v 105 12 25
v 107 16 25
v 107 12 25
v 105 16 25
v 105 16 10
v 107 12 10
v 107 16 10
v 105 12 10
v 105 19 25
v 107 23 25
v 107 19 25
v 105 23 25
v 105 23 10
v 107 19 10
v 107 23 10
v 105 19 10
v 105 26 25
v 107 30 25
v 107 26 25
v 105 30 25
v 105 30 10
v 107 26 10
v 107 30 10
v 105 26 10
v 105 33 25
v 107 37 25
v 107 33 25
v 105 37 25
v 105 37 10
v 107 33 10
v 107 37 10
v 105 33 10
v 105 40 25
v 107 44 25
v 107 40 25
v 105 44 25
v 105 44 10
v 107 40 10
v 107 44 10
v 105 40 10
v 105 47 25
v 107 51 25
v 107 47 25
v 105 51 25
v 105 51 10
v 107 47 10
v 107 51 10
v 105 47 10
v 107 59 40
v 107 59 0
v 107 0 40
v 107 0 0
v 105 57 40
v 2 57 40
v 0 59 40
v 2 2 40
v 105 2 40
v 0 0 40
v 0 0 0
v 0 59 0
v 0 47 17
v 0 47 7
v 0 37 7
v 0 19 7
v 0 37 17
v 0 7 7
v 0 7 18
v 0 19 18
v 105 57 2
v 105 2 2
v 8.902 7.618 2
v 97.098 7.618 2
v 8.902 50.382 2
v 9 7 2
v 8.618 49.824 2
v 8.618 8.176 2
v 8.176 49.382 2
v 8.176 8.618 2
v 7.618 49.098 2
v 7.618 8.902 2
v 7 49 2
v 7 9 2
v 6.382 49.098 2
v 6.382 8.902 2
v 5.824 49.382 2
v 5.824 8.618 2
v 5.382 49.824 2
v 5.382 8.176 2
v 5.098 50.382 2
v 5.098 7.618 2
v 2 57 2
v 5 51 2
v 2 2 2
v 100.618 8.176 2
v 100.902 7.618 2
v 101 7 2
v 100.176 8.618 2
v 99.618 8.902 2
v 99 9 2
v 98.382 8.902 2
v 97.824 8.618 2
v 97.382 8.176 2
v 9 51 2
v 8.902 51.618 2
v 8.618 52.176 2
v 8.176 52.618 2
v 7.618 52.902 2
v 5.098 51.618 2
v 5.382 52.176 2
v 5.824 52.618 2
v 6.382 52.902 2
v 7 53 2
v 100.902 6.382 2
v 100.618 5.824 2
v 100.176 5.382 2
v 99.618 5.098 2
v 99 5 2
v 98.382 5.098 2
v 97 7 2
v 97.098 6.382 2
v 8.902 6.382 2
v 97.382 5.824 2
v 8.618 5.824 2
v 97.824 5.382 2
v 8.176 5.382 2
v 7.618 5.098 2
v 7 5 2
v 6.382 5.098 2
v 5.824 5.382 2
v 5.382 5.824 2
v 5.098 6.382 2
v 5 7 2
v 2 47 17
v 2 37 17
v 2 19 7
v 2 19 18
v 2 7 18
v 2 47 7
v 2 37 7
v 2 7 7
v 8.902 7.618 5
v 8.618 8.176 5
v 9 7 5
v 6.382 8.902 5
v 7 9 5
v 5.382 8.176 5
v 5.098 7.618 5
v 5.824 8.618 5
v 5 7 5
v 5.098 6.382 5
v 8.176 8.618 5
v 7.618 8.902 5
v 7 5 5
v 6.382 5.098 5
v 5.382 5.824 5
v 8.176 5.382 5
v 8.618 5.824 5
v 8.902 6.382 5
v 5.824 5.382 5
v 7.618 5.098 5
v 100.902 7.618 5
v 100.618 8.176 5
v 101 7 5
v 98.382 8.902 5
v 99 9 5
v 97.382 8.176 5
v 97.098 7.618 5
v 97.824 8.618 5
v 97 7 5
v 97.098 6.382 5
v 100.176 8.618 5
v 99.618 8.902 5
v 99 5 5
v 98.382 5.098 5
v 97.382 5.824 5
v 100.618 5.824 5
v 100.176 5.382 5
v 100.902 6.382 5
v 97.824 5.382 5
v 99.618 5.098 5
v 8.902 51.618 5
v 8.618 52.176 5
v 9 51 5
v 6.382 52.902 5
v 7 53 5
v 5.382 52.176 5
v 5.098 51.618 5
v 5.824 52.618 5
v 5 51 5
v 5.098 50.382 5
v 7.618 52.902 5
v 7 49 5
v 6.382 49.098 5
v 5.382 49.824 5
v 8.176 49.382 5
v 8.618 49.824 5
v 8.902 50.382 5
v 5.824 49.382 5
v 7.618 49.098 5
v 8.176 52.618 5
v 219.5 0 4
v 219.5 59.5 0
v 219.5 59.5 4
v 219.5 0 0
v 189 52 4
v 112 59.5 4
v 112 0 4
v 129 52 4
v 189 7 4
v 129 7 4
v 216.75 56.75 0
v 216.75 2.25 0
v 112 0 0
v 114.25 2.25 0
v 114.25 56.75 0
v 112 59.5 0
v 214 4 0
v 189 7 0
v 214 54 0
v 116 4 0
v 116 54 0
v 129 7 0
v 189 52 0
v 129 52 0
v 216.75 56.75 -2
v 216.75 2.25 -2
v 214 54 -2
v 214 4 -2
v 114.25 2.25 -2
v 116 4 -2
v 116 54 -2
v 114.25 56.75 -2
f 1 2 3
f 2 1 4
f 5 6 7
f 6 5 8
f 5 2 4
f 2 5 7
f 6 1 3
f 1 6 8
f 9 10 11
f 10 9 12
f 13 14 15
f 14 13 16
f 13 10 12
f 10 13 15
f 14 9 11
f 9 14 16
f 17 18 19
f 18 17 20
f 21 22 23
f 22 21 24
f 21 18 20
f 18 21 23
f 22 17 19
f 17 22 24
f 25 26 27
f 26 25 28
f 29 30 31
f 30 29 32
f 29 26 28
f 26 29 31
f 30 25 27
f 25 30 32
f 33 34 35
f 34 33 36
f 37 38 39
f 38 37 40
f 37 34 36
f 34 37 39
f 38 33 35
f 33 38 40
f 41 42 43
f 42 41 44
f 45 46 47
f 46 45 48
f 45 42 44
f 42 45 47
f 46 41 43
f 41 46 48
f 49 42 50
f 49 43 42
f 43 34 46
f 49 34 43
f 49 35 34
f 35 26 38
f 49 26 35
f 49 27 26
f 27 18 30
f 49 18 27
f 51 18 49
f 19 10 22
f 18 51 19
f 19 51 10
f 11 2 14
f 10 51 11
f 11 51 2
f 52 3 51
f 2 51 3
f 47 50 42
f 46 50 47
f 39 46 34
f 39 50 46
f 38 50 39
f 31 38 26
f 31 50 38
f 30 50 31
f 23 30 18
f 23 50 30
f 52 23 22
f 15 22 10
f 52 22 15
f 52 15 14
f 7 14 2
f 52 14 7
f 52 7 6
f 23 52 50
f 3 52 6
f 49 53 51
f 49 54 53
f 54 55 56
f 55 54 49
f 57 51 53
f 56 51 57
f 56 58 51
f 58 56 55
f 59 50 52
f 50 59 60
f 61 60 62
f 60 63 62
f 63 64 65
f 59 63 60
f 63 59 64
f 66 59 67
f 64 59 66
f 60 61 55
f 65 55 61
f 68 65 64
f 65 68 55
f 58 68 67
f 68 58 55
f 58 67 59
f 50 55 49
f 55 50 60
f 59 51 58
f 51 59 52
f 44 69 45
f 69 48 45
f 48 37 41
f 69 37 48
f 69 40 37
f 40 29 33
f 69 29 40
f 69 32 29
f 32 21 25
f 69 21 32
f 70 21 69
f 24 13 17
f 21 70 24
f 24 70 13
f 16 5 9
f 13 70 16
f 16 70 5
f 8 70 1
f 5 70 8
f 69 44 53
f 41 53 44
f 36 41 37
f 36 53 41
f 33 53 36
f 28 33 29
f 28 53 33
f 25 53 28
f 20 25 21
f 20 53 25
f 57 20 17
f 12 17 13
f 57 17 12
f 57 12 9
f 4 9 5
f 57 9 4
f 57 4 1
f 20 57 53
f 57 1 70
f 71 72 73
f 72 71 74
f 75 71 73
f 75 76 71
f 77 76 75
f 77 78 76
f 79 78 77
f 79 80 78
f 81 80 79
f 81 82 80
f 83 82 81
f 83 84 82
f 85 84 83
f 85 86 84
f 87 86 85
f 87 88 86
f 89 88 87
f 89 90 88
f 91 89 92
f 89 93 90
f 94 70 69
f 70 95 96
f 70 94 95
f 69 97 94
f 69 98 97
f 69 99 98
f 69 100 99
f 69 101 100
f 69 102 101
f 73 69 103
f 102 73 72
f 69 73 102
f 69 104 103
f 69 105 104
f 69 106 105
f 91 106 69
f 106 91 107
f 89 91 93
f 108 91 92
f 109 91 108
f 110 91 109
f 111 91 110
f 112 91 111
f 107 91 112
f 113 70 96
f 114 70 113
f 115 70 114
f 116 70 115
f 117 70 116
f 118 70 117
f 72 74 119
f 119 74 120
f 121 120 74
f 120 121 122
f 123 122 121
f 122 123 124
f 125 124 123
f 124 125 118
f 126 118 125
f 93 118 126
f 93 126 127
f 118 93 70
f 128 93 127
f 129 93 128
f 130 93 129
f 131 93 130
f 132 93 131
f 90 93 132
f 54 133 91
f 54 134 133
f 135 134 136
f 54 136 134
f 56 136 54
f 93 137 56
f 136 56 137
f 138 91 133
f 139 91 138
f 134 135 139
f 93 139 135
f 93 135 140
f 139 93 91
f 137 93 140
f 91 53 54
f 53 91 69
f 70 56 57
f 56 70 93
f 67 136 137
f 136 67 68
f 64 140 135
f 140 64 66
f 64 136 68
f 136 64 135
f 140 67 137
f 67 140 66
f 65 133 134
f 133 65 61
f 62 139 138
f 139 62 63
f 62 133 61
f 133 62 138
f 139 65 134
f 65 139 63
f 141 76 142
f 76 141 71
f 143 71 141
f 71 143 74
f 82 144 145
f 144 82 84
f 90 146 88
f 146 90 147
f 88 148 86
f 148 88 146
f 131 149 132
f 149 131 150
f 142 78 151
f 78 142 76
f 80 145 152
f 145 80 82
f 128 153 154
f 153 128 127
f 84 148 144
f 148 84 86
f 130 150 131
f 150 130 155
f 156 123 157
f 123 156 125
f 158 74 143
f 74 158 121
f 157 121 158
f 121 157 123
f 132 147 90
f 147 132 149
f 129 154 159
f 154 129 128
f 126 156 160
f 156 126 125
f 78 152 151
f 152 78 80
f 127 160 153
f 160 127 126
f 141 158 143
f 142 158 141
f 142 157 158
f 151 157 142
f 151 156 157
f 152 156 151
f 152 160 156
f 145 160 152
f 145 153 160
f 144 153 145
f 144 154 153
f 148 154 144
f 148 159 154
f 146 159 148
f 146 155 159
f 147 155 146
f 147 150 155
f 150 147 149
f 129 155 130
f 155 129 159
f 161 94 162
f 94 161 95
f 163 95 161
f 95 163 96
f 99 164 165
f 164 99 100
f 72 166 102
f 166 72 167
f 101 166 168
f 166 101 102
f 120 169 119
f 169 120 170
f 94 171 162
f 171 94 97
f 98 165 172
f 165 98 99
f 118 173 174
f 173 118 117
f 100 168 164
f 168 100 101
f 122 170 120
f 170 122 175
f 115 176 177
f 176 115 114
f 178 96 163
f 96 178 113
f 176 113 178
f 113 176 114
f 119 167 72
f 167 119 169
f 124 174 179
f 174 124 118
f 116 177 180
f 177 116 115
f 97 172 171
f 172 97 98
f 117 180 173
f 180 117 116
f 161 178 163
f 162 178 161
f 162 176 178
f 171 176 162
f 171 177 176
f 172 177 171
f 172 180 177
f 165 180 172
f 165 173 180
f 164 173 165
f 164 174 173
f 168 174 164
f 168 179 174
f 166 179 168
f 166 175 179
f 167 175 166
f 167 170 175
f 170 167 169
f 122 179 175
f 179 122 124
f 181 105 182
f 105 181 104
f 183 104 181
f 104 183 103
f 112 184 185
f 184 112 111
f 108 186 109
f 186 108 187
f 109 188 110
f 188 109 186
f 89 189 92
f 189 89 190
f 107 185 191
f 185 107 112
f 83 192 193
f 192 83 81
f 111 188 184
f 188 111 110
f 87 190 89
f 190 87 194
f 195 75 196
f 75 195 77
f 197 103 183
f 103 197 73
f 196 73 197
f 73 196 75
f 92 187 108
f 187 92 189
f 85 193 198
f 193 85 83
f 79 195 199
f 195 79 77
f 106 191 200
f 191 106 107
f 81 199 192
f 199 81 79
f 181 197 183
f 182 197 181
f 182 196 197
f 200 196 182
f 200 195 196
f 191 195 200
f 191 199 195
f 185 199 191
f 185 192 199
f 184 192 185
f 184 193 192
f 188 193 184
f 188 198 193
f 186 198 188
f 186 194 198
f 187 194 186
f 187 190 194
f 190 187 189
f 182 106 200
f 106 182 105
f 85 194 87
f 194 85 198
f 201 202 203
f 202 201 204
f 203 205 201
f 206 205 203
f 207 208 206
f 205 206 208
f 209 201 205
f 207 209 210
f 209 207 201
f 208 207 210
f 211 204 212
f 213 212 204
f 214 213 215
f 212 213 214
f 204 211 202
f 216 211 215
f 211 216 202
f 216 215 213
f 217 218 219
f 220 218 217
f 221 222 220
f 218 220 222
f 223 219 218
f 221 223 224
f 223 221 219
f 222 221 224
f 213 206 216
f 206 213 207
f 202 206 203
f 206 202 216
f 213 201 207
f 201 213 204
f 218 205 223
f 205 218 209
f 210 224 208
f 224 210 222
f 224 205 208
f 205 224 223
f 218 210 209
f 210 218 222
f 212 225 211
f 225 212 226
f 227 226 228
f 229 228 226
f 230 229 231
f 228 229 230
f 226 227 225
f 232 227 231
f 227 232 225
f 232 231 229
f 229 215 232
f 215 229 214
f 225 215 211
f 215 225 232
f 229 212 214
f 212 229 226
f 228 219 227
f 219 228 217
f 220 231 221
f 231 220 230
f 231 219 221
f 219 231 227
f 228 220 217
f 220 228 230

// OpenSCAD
/*
  CAJA PARA RELOJ ARDUINO MEGA + TFT
  Diseño paramétrico para Impresión 3D
*/

// --- PARAMETROS ---
ancho_mega = 54;
largo_mega = 102;
alto_caja = 40;
pared = 2;
tolerancia = 0.5;

// --- DIBUJO ---
part = "all"; // [all, base, lid]

if (part == "all" || part == "base") {
    translate([0, 0, 0]) caja_base();
}

if (part == "all" || part == "lid") {
    translate([part=="all" ? largo_mega + 10 : 0, 0, 0]) tapa();
}

module caja_base() {
    difference() {
        // Cuerpo exterior
        cube([largo_mega + pared*2 + tolerancia*2, ancho_mega + pared*2 + tolerancia*2, alto_caja]);
        
        // Vaciado interior
        translate([pared, pared, pared])
            cube([largo_mega + tolerancia*2, ancho_mega + tolerancia*2, alto_caja]);
            
        // Hueco USB y Alimentacion (Ajustar segun necesites)
        translate([-1, pared + 5, pared + 5])
            cube([pared + 2, 12, 11]); // USB
        
        translate([-1, pared + 35, pared + 5])
            cube([pared + 2, 10, 10]); // Jack Alimentacion
            
        // Ranuras de ventilacion (para sensores)
        for (i = [0 : 5]) {
            translate([largo_mega + pared, pared + 10 + i*7, 10])
                cube([pared + 2, 4, 15]);
        }
    }
    
    // Soportes Arduino (Esquinas)
    translate([pared + 5, pared + 5, pared]) cylinder(h=3, r=2, $fn=20);
    translate([largo_mega + pared - 5, pared + 5, pared]) cylinder(h=3, r=2, $fn=20);
    translate([pared + 5, ancho_mega + pared - 5, pared]) cylinder(h=3, r=2, $fn=20);
}

module tapa() {
    difference() {
        // Tapa exterior
        cube([largo_mega + pared*2 + tolerancia*3, ancho_mega + pared*2 + tolerancia*3, pared*2]);
        
        // Ventana para Pantalla TFT
        // Ajustar coordenadas segun la posicion de tu pantalla
        translate([pared + 15, pared + 5, -1])
            cube([60, 45, pared*3]); 
    }
    
    // Reborde para encajar
    difference() {
        translate([pared + tolerancia/2, pared + tolerancia/2, -pared])
            cube([largo_mega + tolerancia, ancho_mega + tolerancia, pared]);
        translate([pared*2, pared*2, -pared-1])
            cube([largo_mega - pared*2, ancho_mega - pared*2, pared+2]);
    }
}
